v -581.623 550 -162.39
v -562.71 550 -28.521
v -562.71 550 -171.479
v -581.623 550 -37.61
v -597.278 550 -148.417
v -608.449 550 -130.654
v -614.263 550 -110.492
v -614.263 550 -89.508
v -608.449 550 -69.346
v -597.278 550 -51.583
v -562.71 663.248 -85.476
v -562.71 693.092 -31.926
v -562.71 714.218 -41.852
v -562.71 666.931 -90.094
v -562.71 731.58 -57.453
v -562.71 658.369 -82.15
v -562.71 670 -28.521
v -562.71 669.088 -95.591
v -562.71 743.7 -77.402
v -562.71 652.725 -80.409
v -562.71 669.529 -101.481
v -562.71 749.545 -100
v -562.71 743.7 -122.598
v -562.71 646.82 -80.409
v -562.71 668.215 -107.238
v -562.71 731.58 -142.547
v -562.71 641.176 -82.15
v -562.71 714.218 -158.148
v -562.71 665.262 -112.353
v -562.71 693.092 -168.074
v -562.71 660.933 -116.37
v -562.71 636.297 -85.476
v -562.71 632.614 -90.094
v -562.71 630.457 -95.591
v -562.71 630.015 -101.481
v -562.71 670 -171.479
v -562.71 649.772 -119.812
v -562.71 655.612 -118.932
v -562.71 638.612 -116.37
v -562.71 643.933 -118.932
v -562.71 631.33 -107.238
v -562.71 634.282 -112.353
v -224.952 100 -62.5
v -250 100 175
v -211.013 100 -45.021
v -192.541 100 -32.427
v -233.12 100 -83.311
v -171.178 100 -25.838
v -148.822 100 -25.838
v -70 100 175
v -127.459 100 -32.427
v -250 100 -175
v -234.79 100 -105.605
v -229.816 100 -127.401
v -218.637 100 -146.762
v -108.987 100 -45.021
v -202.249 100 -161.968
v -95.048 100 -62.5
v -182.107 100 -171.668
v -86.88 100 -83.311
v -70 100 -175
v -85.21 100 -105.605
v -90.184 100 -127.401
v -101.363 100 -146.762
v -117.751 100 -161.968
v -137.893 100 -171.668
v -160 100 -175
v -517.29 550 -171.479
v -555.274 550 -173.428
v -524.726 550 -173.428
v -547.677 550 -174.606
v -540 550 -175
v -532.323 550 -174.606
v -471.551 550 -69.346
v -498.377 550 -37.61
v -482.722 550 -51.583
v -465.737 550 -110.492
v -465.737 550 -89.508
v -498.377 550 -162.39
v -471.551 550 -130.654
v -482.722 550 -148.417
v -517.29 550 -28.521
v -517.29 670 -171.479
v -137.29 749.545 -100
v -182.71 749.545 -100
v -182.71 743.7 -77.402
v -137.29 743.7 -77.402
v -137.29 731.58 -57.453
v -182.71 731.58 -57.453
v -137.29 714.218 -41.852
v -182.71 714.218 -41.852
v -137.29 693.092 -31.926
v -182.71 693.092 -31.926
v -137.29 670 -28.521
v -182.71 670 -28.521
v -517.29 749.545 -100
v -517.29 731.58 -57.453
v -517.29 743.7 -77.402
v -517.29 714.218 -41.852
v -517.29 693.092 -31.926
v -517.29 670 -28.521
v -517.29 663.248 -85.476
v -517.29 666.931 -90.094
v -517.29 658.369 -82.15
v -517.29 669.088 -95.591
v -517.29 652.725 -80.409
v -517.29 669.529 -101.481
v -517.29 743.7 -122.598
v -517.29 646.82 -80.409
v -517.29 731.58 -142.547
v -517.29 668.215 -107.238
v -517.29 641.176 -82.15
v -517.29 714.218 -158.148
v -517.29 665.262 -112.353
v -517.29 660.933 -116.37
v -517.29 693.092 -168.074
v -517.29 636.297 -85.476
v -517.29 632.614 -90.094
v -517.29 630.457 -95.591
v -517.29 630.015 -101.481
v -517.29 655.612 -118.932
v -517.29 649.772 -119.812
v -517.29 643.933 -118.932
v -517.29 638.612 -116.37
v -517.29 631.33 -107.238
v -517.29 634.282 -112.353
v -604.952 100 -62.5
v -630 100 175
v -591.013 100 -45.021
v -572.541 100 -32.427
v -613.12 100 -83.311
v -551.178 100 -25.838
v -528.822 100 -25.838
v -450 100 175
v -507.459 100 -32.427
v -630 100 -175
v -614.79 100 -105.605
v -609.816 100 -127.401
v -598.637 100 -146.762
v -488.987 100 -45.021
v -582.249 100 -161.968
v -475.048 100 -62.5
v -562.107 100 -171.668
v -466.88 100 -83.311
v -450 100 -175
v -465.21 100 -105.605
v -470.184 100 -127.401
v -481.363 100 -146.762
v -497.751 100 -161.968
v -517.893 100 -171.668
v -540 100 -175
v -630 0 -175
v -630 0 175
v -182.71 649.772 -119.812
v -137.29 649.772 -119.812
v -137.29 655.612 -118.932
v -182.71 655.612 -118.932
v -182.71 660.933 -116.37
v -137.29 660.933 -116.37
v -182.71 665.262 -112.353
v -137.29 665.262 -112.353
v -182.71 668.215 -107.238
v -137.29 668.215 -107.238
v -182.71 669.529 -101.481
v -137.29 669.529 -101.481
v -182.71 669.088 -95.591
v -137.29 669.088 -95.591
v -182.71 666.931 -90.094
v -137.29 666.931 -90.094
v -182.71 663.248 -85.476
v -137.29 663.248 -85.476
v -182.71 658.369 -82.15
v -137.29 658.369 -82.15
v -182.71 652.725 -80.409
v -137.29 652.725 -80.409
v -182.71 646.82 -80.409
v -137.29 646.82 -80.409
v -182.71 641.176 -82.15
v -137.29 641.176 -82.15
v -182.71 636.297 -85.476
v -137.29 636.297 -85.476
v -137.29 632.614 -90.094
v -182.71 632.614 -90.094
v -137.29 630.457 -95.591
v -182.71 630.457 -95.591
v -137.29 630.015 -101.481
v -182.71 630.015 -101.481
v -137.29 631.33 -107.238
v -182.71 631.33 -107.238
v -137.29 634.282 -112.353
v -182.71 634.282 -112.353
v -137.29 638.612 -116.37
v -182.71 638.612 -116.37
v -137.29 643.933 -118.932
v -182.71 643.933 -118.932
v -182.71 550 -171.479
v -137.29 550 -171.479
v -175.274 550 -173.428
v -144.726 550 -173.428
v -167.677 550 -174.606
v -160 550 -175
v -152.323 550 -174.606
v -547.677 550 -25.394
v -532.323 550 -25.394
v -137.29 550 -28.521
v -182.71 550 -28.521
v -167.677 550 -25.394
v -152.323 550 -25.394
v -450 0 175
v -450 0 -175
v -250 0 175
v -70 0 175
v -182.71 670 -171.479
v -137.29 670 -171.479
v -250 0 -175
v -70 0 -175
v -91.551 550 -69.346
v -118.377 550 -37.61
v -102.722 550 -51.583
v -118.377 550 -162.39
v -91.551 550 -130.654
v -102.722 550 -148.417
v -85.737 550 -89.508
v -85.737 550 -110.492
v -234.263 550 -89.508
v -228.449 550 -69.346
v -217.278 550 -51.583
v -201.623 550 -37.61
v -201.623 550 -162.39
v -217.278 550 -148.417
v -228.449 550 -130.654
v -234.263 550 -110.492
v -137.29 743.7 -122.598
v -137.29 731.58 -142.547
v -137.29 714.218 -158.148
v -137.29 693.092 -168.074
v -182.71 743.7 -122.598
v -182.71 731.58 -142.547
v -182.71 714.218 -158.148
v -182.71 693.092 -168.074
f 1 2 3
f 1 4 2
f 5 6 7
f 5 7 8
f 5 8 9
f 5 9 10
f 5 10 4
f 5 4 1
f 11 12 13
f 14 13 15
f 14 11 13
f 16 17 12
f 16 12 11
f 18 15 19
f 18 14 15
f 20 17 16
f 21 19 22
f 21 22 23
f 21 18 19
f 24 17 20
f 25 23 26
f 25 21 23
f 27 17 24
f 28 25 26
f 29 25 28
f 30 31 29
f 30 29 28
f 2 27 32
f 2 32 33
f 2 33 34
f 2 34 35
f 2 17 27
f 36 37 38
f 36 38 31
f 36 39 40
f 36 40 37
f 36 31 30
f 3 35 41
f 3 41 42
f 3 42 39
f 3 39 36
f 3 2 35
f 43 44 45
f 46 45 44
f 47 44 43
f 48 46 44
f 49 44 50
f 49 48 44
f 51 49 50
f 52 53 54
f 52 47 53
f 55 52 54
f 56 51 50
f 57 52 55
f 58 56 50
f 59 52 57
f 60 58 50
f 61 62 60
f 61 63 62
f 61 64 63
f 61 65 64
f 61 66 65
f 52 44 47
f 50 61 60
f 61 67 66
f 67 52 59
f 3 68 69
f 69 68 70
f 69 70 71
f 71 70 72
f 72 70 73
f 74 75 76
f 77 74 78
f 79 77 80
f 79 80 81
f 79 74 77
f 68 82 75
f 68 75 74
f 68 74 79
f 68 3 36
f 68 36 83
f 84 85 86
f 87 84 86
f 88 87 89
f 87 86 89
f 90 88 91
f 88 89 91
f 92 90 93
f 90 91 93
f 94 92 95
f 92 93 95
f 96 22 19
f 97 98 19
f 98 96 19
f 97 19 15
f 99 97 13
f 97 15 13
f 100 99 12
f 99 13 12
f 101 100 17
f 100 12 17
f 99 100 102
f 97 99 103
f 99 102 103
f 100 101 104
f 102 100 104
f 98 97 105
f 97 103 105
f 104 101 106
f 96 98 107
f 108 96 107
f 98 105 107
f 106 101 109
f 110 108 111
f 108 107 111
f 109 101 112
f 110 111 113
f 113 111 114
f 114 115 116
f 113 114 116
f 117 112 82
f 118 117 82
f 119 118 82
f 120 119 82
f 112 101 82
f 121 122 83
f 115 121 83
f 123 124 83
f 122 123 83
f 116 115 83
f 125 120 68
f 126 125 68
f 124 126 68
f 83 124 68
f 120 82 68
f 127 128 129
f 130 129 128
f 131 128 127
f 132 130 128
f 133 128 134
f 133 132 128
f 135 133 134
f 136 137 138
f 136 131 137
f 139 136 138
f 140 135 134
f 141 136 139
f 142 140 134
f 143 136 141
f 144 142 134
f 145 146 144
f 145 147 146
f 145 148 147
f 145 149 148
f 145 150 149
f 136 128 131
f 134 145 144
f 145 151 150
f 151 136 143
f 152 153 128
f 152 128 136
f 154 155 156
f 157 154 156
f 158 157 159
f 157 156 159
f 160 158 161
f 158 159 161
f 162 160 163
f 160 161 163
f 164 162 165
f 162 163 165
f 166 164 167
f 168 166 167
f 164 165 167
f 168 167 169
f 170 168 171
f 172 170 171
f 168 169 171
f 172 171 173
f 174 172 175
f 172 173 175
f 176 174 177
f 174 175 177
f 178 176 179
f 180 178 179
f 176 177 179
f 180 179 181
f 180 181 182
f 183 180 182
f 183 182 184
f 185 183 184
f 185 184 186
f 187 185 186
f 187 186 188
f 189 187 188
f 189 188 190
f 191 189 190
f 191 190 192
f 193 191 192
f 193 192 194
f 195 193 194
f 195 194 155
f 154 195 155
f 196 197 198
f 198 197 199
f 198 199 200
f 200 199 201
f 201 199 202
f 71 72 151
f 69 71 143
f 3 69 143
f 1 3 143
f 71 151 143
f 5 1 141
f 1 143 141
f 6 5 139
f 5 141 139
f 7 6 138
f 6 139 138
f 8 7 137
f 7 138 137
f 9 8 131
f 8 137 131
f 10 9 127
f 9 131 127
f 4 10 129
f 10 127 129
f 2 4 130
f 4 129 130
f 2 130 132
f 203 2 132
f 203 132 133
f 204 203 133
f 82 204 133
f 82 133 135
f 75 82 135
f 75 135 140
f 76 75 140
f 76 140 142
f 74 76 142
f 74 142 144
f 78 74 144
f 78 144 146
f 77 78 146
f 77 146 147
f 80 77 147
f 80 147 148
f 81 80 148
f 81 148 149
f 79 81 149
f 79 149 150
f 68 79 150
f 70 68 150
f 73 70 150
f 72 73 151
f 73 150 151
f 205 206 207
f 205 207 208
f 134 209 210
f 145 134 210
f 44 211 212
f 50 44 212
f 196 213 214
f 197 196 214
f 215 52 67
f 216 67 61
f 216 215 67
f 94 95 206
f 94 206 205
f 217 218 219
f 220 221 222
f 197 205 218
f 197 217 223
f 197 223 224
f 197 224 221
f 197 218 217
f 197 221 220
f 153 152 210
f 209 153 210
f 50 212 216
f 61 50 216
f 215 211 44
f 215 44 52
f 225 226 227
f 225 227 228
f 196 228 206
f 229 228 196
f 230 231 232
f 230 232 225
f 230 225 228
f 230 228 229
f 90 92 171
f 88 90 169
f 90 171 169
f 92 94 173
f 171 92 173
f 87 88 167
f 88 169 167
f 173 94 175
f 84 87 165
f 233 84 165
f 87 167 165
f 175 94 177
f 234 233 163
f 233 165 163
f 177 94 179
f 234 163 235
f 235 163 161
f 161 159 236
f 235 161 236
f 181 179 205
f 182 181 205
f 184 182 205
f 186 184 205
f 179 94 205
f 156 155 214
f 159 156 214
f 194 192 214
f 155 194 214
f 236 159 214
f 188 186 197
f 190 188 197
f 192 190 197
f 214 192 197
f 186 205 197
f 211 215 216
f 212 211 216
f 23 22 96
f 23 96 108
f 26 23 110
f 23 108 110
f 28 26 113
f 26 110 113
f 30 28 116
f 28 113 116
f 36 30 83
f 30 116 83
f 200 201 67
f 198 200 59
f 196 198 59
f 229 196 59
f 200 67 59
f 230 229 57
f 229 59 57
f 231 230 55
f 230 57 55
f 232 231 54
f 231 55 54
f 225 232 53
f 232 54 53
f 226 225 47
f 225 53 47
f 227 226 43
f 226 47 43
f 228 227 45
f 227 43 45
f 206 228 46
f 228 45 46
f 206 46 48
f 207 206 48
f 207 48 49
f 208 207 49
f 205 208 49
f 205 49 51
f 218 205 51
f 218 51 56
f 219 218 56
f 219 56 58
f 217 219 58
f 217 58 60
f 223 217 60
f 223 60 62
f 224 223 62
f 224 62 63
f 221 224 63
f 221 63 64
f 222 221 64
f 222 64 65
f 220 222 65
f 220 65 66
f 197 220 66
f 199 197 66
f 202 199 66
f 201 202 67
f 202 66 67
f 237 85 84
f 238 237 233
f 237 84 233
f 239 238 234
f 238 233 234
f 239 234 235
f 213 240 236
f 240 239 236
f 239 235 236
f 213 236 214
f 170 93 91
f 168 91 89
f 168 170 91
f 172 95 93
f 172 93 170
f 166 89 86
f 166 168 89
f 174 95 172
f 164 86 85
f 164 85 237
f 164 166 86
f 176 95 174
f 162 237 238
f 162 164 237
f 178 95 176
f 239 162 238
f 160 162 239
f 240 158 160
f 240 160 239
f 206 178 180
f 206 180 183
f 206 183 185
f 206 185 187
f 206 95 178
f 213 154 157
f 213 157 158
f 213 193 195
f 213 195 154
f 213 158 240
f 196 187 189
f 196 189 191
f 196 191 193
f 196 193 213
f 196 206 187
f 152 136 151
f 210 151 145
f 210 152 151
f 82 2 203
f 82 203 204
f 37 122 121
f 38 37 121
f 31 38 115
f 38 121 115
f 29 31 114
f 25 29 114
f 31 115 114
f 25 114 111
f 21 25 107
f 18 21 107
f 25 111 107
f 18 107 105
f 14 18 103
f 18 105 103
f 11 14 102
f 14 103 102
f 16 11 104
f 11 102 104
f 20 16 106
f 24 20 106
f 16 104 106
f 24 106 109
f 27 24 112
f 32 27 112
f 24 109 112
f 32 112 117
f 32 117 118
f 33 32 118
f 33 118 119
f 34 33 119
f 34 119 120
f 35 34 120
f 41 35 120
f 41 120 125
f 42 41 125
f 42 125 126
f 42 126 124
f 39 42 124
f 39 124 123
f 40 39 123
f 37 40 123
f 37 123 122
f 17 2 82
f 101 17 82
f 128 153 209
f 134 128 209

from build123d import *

# Parameters (mm, degrees)
SKETCH1_W             = 180
SKETCH1_H             = 350
BOSS_EXTRUDE1_DEPTH   = 100
BOSS_EXTRUDE1_2_DEPTH = 100
SKETCH2_R             = 75
BOSS_EXTRUDE2_DEPTH   = 450
SKETCH3_W             = 45.419423784
SKETCH3_H             = 142.958301414
BOSS_EXTRUDE3_DEPTH   = 200
FILLET1_R             = 80
FILLET2_R             = 80
SKETCH4_R             = 19.812422485
CUT_EXTRUDE1_DEPTH    = 579


with BuildPart() as part:
    # Sketch1 → Boss-Extrude1 (new body)
    with BuildSketch(Plane(origin=(0, 0, 0), x_dir=(1, 0, 0), z_dir=(0, 1, 0))):
        with Locations((-540, 0)):
            Rectangle(SKETCH1_W, SKETCH1_H)
    extrude(amount=BOSS_EXTRUDE1_DEPTH)



with BuildPart() as body_2:
    # Sketch1 → Boss-Extrude1 2 (new body)
    with BuildSketch(Plane(origin=(0, 0, 0), x_dir=(1, 0, 0), z_dir=(0, 1, 0))):
        with Locations((-160, 0)):
            Rectangle(SKETCH1_W, SKETCH1_H)
    extrude(amount=BOSS_EXTRUDE1_2_DEPTH)


with BuildPart() as part_1:
    add(part.part)

    add(body_2.part)  # Boss-Extrude2 merges body 2
    # Sketch2 → Boss-Extrude2 (add)
    with BuildSketch(Plane(origin=(0, 100, 0), x_dir=(1, 0, 0), z_dir=(0, 1, 0))):
        with Locations(Location((-540, 100, 0), (0, 0, 90))):
            Circle(SKETCH2_R)
        with Locations(Location((-160, 100, 0), (0, 0, 90))):
            Circle(SKETCH2_R)
    extrude(amount=BOSS_EXTRUDE2_DEPTH)

    # Sketch3 → Boss-Extrude3 (add)
    with BuildSketch(Plane(origin=(0, 550, 0), x_dir=(1, 0, 0), z_dir=(0, 1, 0))):
        with Locations((-540, 100)):
            Rectangle(SKETCH3_W, SKETCH3_H)
        with Locations((-160, 100)):
            Rectangle(SKETCH3_W, SKETCH3_H)
    extrude(amount=BOSS_EXTRUDE3_DEPTH)

    # Fillet1
    # the kernel refuses this fillet: 80 mm, written as the material it takes off along each edge
    with BuildSketch(Plane(origin=(-317.290288108, 750, -171.479150707), x_dir=(0, -1, 0), z_dir=(-1, 0, 0)), Plane(origin=(-762.709711892, 750, -28.520849293), x_dir=(0, -1, 0), z_dir=(1, 0, 0))) as fillet1_piece_1:
        with BuildLine():
            CenterArc((FILLET1_R, FILLET1_R), FILLET1_R, 180, 90)
            Line((0, FILLET1_R), (0, 0))
            Line((0, 0), (FILLET1_R, 0))
        make_face()
    extrude(amount=445.419423783, mode=Mode.SUBTRACT)

    # Fillet2
    # the kernel refuses this fillet: 80 mm, written as the material it takes off along each edge
    with BuildSketch(Plane(origin=(62.709711892, 750, -171.479150707), x_dir=(0, -1, 0), z_dir=(-1, 0, 0)), Plane(origin=(-382.709711892, 750, -28.520849293), x_dir=(0, -1, 0), z_dir=(1, 0, 0))) as fillet2_piece_1:
        with BuildLine():
            CenterArc((FILLET2_R, FILLET2_R), FILLET2_R, 180, 90)
            Line((0, FILLET2_R), (0, 0))
            Line((0, 0), (FILLET2_R, 0))
        make_face()
    extrude(amount=445.419423783, mode=Mode.SUBTRACT)

    # Sketch4 → Cut-Extrude1 (cut)
    with BuildSketch(Plane(origin=(-137.290288108, 0, 0), x_dir=(0, 0, -1), z_dir=(1, 0, 0))):
        with Locations((100, 649.772462607)):
            Circle(SKETCH4_R)
    extrude(amount=-CUT_EXTRUDE1_DEPTH, mode=Mode.SUBTRACT)


solid = part_1.part
